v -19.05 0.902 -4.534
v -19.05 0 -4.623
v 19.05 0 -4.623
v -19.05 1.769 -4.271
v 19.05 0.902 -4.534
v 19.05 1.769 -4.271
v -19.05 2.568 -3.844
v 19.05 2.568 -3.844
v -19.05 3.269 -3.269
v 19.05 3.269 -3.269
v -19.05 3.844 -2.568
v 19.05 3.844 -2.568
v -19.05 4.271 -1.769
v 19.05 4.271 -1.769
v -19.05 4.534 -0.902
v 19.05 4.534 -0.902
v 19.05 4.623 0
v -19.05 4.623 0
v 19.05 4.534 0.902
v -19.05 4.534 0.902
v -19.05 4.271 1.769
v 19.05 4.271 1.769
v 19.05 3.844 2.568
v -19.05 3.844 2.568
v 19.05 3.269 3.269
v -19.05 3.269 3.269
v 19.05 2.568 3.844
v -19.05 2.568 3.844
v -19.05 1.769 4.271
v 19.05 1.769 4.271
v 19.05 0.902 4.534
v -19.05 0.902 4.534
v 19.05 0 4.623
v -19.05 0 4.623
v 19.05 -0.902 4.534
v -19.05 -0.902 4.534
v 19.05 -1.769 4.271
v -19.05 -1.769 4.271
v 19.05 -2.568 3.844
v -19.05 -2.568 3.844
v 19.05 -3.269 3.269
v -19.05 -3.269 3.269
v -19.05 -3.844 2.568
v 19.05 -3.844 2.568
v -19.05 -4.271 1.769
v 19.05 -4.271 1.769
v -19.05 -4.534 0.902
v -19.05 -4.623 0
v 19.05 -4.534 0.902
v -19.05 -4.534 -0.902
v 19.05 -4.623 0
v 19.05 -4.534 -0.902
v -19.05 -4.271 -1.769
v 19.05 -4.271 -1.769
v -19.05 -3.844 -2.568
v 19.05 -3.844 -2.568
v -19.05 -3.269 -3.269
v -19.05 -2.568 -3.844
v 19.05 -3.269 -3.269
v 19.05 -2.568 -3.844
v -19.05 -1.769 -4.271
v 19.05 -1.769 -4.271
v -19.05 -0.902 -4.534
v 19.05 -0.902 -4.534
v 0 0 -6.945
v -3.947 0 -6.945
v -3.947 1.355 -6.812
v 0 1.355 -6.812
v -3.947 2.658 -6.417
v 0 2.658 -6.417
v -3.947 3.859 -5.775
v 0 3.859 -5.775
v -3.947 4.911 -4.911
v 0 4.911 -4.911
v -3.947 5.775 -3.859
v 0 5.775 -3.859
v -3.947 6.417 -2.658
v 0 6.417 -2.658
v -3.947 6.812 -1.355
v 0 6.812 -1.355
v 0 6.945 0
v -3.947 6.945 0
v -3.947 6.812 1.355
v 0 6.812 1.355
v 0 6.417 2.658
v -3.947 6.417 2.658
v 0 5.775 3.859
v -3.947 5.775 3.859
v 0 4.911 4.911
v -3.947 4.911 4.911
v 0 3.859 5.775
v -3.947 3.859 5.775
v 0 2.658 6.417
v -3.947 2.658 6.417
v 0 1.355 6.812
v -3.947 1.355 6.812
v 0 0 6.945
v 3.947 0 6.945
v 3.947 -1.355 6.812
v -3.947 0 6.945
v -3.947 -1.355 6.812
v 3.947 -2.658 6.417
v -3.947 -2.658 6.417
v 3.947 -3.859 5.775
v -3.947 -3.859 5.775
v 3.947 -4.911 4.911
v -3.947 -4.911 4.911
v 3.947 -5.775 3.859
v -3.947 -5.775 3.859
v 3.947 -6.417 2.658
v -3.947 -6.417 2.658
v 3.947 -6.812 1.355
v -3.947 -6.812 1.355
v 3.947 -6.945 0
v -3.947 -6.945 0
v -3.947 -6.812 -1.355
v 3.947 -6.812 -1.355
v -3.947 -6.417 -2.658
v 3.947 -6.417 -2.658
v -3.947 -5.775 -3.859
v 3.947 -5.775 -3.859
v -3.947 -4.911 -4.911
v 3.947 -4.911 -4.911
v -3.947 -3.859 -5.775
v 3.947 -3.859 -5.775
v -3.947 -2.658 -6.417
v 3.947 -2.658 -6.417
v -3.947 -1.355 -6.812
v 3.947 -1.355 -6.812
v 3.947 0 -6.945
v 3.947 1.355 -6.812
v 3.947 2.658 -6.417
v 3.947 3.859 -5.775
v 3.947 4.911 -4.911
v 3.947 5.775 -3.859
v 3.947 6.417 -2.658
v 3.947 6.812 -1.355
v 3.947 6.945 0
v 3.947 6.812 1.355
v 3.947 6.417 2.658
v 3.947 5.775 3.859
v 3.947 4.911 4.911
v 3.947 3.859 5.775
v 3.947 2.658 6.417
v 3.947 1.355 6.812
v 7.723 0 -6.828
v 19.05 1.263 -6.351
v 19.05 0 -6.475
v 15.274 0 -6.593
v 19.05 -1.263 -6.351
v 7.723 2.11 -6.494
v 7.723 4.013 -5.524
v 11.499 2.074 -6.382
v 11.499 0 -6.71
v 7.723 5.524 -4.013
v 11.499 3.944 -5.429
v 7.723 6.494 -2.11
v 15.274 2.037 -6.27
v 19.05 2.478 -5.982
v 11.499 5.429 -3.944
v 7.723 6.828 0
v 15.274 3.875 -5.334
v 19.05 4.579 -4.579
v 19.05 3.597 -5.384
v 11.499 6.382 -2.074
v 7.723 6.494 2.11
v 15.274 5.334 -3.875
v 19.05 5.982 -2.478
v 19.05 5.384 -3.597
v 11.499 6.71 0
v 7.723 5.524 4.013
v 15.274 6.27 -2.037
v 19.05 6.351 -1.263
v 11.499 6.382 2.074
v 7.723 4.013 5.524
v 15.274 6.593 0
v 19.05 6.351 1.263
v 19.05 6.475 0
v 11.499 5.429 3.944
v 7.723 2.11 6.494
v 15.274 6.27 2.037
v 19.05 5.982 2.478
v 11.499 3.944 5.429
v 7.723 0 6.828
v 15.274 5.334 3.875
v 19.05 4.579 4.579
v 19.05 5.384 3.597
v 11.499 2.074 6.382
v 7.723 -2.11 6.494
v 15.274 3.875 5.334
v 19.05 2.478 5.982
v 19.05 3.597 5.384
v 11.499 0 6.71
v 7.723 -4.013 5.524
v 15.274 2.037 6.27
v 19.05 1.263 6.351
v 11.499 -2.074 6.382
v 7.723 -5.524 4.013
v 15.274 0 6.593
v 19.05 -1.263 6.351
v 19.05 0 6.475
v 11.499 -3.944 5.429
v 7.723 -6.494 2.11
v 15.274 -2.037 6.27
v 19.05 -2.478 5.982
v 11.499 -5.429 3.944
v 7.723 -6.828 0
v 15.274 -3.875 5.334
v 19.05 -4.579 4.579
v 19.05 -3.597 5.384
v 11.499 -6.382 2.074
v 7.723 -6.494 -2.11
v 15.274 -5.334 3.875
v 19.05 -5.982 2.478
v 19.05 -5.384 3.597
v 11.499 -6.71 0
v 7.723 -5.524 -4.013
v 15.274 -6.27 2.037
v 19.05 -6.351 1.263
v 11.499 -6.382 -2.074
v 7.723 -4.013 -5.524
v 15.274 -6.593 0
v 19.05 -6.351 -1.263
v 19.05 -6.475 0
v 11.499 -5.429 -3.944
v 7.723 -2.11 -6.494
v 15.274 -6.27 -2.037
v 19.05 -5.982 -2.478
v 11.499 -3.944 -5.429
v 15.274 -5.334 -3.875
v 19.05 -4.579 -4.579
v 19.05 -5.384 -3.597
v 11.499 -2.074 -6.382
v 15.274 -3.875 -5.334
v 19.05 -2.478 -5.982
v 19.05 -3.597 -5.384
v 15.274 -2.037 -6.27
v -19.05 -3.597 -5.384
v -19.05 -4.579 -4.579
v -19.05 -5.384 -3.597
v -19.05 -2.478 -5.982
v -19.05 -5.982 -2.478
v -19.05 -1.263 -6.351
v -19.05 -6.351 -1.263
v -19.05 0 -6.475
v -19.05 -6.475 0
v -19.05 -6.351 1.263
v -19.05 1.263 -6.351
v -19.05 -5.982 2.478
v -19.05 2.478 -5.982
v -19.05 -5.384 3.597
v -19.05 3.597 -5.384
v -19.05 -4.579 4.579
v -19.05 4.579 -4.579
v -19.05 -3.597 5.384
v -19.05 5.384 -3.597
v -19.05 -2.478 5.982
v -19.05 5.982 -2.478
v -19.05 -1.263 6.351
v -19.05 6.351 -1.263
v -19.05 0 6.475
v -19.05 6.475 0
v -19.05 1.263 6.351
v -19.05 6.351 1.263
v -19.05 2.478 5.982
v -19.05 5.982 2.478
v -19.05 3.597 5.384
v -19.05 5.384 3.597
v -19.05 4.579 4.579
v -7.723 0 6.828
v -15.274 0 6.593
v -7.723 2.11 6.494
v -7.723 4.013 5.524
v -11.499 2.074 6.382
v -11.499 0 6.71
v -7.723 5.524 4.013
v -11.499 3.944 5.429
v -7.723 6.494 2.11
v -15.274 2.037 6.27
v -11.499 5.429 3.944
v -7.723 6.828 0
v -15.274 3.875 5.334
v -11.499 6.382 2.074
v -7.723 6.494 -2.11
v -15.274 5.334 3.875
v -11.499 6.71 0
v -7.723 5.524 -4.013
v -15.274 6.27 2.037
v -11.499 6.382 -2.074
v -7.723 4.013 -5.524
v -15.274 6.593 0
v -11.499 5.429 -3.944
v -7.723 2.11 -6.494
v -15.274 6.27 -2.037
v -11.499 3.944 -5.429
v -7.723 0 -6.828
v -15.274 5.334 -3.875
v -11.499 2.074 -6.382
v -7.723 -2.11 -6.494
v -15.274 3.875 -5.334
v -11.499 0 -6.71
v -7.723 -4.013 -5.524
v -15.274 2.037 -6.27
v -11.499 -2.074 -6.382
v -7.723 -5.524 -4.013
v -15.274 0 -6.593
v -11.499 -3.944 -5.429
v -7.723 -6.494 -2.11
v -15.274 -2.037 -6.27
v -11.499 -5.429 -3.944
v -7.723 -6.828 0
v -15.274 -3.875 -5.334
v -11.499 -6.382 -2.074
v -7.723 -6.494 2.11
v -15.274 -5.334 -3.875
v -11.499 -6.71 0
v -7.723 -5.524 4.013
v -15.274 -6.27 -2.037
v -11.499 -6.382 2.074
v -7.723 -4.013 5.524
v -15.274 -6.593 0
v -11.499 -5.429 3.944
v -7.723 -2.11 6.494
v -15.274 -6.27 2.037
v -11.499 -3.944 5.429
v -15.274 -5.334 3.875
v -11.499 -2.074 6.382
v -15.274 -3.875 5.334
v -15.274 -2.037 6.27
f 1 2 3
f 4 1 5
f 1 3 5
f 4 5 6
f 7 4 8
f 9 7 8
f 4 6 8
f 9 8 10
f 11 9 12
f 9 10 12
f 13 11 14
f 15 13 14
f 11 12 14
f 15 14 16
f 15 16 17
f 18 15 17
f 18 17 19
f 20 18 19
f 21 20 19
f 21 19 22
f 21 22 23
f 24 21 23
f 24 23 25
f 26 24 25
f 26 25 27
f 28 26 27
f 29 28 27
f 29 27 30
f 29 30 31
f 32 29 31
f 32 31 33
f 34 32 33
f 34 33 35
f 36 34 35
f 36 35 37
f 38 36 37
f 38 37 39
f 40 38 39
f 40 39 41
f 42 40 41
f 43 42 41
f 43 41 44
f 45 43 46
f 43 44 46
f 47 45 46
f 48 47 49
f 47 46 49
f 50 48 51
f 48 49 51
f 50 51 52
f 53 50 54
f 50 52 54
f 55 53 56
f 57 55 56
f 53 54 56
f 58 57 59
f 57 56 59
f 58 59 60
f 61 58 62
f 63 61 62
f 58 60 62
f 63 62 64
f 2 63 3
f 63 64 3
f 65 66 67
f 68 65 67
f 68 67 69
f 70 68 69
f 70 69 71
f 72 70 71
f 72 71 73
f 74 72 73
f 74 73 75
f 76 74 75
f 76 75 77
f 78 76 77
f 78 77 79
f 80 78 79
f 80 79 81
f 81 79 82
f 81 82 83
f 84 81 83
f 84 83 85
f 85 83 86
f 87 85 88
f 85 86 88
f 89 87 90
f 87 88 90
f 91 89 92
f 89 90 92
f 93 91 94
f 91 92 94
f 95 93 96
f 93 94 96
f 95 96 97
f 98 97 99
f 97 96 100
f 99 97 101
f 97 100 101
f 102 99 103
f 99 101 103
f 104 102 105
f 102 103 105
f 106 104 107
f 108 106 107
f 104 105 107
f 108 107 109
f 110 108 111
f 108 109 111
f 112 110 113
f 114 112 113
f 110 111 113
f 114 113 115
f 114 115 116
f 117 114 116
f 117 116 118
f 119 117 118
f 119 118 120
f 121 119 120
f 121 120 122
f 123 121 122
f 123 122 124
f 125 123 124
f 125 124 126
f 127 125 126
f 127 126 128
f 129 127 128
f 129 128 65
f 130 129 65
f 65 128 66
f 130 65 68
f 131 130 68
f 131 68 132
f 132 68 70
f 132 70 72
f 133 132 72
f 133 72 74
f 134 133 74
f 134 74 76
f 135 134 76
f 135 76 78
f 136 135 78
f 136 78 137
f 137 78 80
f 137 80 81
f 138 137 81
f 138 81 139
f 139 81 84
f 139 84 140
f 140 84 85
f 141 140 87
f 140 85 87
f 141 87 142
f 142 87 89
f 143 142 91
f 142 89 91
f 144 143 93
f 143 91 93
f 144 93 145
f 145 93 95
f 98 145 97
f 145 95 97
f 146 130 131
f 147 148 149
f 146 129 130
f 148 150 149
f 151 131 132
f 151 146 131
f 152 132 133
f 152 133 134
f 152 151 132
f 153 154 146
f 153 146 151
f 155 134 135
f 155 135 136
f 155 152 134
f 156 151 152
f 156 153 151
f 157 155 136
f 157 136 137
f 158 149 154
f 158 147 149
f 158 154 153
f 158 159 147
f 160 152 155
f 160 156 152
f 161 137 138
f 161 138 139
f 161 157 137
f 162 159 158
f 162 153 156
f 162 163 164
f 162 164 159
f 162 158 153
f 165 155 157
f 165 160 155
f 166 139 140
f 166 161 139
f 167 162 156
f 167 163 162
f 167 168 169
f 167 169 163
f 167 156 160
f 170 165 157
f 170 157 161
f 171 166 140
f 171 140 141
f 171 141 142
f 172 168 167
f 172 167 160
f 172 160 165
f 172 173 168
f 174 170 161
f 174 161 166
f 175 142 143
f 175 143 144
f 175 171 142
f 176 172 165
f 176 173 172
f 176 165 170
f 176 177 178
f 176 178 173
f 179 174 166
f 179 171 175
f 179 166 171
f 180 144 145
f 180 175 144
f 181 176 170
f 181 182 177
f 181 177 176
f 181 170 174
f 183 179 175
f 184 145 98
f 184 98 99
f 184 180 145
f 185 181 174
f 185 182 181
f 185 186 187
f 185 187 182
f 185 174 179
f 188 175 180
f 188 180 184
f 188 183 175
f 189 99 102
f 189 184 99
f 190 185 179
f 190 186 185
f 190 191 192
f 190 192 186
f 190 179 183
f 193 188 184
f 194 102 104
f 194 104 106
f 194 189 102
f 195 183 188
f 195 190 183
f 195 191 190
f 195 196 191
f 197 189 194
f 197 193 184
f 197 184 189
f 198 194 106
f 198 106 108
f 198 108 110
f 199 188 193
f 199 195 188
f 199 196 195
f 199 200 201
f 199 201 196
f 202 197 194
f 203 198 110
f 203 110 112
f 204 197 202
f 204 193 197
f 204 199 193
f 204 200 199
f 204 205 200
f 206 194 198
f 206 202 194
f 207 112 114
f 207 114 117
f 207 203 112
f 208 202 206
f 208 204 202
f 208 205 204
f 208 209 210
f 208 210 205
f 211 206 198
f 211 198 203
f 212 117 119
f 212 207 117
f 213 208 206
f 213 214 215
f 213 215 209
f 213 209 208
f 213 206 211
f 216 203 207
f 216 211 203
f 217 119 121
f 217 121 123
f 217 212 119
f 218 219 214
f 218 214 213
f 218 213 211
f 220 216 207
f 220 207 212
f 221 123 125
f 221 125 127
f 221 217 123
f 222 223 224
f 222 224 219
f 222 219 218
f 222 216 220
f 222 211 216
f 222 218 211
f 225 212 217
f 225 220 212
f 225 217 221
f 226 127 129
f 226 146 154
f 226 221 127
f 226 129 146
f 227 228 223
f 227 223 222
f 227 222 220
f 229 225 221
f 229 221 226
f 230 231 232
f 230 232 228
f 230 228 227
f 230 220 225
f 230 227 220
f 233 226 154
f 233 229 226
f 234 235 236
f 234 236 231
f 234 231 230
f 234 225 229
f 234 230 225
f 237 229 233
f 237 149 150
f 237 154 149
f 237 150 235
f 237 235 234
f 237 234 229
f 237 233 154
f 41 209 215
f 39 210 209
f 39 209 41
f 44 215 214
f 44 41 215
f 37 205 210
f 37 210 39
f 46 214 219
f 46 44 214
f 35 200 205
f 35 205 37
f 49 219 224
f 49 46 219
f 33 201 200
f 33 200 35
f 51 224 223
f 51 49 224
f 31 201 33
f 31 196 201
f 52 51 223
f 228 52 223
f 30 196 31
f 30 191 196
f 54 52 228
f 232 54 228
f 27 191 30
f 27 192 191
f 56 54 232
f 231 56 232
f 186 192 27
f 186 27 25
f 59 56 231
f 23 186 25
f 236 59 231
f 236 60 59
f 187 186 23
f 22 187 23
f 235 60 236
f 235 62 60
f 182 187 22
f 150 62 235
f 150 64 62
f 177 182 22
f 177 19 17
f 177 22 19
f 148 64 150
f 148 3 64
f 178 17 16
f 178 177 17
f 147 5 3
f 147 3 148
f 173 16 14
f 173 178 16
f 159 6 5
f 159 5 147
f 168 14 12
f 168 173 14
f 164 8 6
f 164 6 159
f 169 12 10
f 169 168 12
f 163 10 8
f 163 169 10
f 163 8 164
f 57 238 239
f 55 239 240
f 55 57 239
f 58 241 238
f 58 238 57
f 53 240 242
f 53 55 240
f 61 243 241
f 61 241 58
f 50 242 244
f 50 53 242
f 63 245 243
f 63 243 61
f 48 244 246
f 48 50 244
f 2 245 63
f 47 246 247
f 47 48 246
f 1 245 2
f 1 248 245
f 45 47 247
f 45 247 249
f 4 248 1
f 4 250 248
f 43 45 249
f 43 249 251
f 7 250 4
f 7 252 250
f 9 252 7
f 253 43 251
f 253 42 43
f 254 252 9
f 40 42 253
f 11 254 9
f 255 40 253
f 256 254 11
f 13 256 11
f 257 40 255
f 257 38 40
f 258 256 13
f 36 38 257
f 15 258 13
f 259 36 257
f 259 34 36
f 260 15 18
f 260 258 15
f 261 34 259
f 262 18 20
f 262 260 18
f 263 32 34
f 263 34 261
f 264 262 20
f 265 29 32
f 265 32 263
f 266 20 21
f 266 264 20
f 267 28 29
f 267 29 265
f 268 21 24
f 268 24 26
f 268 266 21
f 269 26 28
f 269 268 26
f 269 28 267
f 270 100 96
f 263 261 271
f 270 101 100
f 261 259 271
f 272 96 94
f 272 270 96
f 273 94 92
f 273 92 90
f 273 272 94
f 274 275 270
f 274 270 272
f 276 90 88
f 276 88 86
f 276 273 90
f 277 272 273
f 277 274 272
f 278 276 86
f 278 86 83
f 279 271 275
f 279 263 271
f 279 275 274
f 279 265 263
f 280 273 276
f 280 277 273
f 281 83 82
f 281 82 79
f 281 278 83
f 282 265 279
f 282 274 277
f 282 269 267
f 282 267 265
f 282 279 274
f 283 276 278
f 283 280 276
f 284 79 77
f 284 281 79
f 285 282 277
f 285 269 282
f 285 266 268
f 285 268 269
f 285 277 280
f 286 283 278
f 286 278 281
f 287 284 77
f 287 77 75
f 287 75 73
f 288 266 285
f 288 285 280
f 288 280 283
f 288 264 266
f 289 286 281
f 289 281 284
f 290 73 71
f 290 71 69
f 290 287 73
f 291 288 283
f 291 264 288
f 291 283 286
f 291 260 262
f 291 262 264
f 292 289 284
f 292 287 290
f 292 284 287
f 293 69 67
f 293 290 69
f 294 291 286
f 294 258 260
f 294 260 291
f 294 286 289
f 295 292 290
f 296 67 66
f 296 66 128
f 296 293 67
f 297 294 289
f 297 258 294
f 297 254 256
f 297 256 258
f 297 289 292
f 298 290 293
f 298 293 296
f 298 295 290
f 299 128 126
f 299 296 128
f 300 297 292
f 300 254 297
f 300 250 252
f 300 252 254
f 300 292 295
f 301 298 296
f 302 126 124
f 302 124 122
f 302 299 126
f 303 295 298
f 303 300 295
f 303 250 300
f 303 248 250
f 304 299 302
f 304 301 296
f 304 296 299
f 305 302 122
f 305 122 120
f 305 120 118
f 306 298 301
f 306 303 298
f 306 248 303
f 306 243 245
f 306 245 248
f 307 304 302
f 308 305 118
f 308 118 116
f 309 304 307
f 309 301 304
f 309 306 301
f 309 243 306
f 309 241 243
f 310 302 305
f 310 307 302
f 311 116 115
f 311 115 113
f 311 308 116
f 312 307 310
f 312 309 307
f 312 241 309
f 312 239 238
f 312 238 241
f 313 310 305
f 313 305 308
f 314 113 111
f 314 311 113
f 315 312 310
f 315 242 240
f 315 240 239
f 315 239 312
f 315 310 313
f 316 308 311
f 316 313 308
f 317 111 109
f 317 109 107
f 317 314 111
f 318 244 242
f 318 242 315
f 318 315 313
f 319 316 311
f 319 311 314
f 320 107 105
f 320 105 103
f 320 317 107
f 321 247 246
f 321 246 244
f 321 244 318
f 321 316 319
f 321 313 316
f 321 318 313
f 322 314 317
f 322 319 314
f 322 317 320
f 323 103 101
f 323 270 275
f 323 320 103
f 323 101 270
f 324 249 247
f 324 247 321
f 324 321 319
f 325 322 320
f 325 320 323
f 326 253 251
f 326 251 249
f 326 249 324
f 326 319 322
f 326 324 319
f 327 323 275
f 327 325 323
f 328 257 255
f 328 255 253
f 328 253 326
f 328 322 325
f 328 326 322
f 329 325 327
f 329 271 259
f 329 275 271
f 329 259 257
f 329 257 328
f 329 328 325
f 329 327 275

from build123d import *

# Parameters (mm, degrees)
SKETCH2_R          = 6.9453125
EXTRUDE1_DEPTH     = 15.10284
EXTRUDE1_TAPER     = 1.783333333
SKETCH11_R         = 6.9453125
EXTRUDE4_DEPTH     = 3.94716
SKETCH13_R         = 6.598046875
EXTRUDE5_DEPTH     = 1.058333333
CIRPATTERN1_COUNT  = 2
SKETCH5_R          = 4.6228
CUT_EXTRUDE3_DEPTH = 40.345708049


with BuildPart() as part:
    # Sketch2 → Extrude1 (new body)
    with BuildSketch(Plane(origin=(3.94716, 0, 0), x_dir=(0, 0, -1), z_dir=(1, 0, 0))):
        Circle(SKETCH2_R)
    extrude(amount=EXTRUDE1_DEPTH, taper=EXTRUDE1_TAPER)



with BuildPart() as body_2:
    # Sketch11 → Extrude4 (new body)
    with BuildSketch(Plane.ZY.offset(-3.94716)):
        Circle(SKETCH11_R)
    extrude(amount=EXTRUDE4_DEPTH)


with BuildPart() as part_1:
    add(part.part)

    add(body_2.part)  # Extrude5 merges body 2
    # Sketch13 → Extrude5 (add)
    with BuildSketch(Plane.ZY.offset(-3.94716)):
        Circle(SKETCH13_R)
    extrude(amount=EXTRUDE5_DEPTH)


with BuildPart() as cirpattern1_1:
    # CirPattern1: pattern copy
    add(part_1.part.rotate(Axis((0, 27.182238006, 0), (0, -1, 0)), 1 * 360 / CIRPATTERN1_COUNT))


with BuildPart() as part_2:
    add(part_1.part)

    # Combine1: union CirPattern1_1
    add(cirpattern1_1.part)

    # Sketch5 → Cut-Extrude3 (cut, through all)
    with BuildSketch(Plane(origin=(19.05, 0, 0), x_dir=(0, 0, -1), z_dir=(1, 0, 0))):
        Circle(SKETCH5_R)
    extrude(amount=-CUT_EXTRUDE3_DEPTH, mode=Mode.SUBTRACT)


solid = part_2.part
